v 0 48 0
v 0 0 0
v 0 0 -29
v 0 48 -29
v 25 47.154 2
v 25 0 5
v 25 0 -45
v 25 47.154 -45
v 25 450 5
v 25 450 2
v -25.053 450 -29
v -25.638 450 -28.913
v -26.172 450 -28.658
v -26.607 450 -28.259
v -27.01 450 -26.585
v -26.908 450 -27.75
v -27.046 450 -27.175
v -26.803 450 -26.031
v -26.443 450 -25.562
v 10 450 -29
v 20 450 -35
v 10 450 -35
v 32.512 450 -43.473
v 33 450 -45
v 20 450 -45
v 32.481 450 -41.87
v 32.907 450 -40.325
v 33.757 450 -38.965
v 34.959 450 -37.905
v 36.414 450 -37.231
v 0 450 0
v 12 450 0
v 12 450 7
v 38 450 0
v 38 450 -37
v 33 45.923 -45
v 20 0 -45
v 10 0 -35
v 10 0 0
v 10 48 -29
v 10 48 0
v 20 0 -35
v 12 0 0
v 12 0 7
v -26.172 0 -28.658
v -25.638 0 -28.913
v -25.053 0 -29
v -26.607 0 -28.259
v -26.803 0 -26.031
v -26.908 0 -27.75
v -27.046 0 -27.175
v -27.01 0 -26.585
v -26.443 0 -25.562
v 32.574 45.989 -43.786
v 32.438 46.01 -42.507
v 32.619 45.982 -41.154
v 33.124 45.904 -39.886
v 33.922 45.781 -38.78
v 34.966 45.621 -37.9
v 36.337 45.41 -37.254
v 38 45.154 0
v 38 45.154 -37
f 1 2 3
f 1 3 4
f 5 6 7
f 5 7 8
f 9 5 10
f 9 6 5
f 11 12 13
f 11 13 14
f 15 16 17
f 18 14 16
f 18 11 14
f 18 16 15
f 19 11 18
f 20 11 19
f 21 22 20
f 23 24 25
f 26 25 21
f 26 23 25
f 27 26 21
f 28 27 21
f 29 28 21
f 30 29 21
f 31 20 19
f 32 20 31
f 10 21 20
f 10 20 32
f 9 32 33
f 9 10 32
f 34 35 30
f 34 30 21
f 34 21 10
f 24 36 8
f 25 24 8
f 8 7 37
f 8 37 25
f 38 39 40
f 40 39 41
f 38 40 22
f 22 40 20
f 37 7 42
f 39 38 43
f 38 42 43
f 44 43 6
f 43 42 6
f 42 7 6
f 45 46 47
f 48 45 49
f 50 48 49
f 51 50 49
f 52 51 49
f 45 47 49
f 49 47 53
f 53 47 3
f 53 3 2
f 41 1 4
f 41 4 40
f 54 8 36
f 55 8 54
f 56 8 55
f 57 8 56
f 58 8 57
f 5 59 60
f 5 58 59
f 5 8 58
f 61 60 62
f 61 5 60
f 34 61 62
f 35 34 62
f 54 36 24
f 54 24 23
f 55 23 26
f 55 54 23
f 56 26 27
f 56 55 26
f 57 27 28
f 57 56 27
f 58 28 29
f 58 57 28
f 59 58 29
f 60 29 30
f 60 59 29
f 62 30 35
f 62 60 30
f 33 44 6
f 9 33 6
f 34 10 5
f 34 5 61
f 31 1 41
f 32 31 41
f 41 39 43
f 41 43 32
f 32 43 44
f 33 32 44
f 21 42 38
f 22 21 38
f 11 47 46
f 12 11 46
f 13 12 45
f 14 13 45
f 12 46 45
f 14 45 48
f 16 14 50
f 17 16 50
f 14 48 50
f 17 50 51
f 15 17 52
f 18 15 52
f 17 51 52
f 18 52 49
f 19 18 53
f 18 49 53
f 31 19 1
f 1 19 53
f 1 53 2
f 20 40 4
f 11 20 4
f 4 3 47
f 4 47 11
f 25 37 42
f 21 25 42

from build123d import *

# Parameters (mm, degrees)
PAD005_DEPTH    = 450
POCKET002_DEPTH = 60
SKETCH011_W     = 10
SKETCH011_H     = 48
POCKET003_DEPTH = 60


with BuildPart() as part:
    # Sketch008 → Pad005 (new body)
    with BuildSketch(Plane.ZX):
        with BuildLine():
            Line((0, 0), (0, 12))
            Line((0, 12), (7, 12))
            Line((7, 12), (5, 25))
            Line((5, 25), (2, 25))
            Line((2, 25), (0, 38))
            Line((0, 38), (-37, 38))
            ThreePointArc((-45, 33), (-39.614381, 33.283009), (-37, 38))
            Line((-45, 33), (-45, 20))
            Line((-45, 20), (-35, 20))
            Line((-35, 20), (-35, 10))
            Line((-35, 10), (-29, 10))
            Line((-29, 10), (-29, -25.053428))
            ThreePointArc((-29, -25.053428), (-27.749682, -26.907606), (-25.562023, -26.443472))
            Line((-25.562023, -26.443472), (0, 0))
        make_face()
    extrude(amount=PAD005_DEPTH)

    # Sketch010 → Pocket002 (cut)
    with BuildSketch(Plane.XY.offset(10)):
        Polygon((25, 0), (25, 47.153846), (39, 45), (39, 0), align=None)
    extrude(amount=-POCKET002_DEPTH, mode=Mode.SUBTRACT)

    # Sketch011 → Pocket003 (cut)
    with BuildSketch(Plane.XY.offset(10)):
        with Locations((5, 24)):
            Rectangle(SKETCH011_W, SKETCH011_H)
    extrude(amount=-POCKET003_DEPTH, mode=Mode.SUBTRACT)


solid = part.part
